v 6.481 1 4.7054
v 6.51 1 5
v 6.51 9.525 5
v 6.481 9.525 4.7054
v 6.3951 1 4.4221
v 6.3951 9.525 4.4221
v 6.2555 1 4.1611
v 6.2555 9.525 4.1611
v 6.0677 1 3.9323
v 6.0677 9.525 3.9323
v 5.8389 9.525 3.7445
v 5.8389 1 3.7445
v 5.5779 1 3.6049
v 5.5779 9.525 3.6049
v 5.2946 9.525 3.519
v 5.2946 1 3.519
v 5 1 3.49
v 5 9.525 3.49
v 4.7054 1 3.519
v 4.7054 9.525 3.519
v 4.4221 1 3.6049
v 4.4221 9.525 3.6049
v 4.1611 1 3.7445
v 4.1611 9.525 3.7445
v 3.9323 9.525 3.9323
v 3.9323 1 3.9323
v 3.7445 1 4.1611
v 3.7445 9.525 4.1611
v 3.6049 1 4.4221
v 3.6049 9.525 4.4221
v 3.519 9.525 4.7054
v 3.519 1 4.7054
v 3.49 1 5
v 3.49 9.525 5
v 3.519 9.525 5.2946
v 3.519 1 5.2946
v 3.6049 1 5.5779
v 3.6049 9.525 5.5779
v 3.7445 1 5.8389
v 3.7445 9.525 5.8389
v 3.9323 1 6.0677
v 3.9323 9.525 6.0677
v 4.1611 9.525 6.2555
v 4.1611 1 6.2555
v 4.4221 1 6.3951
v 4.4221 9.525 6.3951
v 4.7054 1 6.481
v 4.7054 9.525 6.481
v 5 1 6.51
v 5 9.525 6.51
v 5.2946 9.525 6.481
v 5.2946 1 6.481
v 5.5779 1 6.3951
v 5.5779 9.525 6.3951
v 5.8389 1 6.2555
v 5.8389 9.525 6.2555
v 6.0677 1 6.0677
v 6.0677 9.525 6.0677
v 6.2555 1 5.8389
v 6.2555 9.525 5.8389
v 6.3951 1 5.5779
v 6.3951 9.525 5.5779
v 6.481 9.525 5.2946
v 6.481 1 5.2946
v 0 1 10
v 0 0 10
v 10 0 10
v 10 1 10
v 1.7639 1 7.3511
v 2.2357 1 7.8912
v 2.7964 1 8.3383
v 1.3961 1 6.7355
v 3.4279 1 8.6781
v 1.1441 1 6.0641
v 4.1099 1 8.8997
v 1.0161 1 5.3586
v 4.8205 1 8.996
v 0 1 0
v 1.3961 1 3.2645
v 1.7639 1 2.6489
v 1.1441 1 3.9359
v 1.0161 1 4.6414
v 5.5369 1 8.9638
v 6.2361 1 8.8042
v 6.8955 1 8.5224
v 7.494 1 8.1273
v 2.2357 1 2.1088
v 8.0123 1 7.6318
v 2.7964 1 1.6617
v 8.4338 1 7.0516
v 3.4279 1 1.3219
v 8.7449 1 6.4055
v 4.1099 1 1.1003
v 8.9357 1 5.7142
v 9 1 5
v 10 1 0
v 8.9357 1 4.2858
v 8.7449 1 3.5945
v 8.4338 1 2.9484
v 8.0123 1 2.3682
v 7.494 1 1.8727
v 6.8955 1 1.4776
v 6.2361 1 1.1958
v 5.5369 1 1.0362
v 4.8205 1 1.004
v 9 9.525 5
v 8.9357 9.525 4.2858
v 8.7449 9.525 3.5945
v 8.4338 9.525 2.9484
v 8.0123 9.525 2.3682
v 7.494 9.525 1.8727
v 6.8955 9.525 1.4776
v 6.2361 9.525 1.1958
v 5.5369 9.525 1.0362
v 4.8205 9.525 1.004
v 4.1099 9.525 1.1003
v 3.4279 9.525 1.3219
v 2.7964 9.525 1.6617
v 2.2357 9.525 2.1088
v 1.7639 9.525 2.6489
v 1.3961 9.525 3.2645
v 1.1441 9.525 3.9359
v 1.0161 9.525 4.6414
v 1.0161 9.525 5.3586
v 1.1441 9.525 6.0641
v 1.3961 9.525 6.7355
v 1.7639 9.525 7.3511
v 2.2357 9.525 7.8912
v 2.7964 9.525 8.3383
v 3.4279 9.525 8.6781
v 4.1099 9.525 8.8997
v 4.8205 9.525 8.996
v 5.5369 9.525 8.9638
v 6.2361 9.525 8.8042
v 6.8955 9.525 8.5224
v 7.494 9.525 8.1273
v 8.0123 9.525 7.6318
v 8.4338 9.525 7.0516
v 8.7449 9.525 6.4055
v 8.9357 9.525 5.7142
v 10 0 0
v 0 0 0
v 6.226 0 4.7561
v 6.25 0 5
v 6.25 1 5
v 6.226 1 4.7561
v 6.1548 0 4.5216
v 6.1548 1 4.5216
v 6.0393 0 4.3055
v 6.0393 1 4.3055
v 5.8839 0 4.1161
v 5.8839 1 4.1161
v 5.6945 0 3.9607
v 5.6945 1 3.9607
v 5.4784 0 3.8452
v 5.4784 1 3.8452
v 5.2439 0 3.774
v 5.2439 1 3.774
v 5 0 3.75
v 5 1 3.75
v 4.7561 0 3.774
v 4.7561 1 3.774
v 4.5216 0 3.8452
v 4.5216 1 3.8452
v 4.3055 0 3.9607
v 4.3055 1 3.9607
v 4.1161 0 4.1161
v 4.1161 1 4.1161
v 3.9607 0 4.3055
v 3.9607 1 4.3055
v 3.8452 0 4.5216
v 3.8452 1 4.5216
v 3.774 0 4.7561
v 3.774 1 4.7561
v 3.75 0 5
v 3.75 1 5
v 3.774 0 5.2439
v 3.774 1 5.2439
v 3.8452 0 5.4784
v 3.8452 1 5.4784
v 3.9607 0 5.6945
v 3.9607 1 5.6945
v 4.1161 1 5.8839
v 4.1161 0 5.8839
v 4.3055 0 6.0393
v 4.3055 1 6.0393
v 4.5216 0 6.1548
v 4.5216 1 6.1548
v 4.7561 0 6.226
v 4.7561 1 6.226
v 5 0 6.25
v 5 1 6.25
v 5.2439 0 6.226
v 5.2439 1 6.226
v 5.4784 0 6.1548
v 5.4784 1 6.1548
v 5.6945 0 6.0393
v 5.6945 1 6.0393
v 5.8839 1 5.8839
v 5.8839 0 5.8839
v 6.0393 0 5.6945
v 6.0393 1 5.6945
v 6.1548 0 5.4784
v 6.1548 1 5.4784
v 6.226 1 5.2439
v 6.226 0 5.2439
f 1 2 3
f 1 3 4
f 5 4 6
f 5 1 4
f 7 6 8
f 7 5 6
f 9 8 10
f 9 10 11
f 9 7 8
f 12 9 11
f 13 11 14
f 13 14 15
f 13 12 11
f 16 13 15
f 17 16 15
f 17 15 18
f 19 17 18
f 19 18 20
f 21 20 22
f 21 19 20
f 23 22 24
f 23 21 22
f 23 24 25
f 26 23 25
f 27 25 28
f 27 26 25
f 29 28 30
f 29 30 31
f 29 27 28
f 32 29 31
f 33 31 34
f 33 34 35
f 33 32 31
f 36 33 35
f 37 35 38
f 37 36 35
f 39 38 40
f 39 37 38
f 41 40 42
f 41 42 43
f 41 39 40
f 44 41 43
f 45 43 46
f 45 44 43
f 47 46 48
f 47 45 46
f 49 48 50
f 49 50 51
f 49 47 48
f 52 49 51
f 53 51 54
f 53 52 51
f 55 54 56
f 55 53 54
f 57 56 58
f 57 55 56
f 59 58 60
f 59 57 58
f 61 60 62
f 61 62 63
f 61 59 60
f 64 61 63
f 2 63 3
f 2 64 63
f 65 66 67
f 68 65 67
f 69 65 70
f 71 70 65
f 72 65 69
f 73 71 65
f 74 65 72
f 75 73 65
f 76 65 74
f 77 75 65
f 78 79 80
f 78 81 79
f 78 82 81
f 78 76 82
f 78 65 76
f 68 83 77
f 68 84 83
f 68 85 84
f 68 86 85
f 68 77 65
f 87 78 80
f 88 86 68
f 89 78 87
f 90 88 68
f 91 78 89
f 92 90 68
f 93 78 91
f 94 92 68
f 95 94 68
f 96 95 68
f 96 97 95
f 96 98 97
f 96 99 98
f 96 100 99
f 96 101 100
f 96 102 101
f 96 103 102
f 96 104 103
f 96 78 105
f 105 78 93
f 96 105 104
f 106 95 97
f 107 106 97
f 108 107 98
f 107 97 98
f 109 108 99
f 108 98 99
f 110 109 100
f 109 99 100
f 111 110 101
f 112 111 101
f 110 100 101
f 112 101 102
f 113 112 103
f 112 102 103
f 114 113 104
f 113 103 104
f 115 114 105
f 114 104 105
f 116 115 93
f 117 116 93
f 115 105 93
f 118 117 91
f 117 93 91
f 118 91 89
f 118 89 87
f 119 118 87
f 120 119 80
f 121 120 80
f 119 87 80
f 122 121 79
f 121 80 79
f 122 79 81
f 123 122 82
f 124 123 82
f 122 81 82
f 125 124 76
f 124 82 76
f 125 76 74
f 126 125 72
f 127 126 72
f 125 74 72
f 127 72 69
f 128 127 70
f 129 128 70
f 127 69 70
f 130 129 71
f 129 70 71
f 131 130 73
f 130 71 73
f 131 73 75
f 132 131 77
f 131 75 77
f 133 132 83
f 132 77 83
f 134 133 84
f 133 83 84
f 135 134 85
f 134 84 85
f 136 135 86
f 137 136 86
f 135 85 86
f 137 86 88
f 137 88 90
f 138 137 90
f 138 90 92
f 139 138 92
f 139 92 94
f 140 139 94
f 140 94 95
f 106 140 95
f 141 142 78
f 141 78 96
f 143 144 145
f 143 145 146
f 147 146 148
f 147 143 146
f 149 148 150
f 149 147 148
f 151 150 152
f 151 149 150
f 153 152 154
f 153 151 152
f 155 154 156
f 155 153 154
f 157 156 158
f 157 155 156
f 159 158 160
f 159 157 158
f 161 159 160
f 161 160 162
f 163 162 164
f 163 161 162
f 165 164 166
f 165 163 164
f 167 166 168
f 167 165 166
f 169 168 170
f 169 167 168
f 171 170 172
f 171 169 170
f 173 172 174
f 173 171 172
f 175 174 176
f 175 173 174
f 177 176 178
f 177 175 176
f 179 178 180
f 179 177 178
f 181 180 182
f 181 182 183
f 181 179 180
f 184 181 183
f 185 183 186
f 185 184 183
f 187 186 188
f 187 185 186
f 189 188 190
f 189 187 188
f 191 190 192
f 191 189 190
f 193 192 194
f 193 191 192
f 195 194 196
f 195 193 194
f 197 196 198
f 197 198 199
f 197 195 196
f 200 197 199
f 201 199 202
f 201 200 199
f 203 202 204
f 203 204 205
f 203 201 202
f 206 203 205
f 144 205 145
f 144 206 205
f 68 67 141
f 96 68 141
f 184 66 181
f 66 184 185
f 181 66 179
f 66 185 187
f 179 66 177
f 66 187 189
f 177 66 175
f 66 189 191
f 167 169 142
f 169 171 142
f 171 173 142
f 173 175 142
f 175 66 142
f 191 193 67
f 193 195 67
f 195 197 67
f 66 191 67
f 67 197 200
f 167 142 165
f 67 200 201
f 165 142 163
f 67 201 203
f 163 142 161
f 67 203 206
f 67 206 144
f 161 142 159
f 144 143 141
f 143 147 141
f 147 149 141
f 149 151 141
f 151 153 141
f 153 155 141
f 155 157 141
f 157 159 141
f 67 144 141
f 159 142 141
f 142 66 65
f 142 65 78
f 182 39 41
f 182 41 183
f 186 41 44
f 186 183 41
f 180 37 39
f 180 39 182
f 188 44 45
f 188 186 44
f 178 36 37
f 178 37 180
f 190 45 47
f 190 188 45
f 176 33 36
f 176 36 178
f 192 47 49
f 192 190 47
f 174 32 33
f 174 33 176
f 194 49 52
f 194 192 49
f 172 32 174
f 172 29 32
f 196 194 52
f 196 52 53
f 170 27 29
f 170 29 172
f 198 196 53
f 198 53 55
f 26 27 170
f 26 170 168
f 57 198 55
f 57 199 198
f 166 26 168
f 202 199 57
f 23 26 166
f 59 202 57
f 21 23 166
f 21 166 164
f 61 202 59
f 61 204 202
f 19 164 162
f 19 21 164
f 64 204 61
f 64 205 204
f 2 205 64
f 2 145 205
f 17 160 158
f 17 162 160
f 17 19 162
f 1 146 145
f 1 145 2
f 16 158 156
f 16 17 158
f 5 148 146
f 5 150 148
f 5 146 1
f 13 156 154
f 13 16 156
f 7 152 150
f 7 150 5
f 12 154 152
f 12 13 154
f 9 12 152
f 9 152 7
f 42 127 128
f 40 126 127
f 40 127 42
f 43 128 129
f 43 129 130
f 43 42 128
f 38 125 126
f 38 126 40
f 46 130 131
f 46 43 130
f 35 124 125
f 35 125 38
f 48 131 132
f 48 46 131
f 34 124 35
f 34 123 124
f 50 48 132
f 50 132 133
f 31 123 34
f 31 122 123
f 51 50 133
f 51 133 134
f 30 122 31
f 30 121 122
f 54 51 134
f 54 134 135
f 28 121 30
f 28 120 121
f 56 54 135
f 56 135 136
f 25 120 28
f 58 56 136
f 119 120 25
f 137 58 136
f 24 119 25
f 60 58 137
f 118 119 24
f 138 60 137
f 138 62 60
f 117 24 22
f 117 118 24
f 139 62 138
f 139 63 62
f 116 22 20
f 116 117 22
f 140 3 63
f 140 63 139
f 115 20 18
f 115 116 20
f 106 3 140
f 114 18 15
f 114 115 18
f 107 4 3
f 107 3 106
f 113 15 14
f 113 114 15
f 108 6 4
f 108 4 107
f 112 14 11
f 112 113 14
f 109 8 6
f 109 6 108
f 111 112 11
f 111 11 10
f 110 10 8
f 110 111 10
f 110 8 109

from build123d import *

# Parameters (mm, degrees)
SKETCH1_W           = 10
SKETCH1_H           = 10
SKETCH1_R           = 1.25
BOSS_EXTRUDE1_DEPTH = 1
SKETCH2_R           = 4
SKETCH2_R_2         = 1.51
BOSS_EXTRUDE2_DEPTH = 8.525


with BuildPart() as part:
    # Sketch1 → Boss-Extrude1 (new body)
    with BuildSketch(Plane(origin=(0, 0, 0), x_dir=(1, 0, 0), z_dir=(0, 1, 0))):
        with Locations((5, -5)):
            Rectangle(SKETCH1_W, SKETCH1_H)
        with Locations((5, -5)):
            Circle(SKETCH1_R, mode=Mode.SUBTRACT)
    extrude(amount=BOSS_EXTRUDE1_DEPTH)

    # Sketch2 → Boss-Extrude2 (add)
    with BuildSketch(Plane(origin=(0, 1, 0), x_dir=(1, 0, 0), z_dir=(0, 1, 0))):
        with Locations((5, -5)):
            Circle(SKETCH2_R)
        with Locations((5, -5)):
            Circle(SKETCH2_R_2, mode=Mode.SUBTRACT)
    extrude(amount=BOSS_EXTRUDE2_DEPTH)


solid = part.part
